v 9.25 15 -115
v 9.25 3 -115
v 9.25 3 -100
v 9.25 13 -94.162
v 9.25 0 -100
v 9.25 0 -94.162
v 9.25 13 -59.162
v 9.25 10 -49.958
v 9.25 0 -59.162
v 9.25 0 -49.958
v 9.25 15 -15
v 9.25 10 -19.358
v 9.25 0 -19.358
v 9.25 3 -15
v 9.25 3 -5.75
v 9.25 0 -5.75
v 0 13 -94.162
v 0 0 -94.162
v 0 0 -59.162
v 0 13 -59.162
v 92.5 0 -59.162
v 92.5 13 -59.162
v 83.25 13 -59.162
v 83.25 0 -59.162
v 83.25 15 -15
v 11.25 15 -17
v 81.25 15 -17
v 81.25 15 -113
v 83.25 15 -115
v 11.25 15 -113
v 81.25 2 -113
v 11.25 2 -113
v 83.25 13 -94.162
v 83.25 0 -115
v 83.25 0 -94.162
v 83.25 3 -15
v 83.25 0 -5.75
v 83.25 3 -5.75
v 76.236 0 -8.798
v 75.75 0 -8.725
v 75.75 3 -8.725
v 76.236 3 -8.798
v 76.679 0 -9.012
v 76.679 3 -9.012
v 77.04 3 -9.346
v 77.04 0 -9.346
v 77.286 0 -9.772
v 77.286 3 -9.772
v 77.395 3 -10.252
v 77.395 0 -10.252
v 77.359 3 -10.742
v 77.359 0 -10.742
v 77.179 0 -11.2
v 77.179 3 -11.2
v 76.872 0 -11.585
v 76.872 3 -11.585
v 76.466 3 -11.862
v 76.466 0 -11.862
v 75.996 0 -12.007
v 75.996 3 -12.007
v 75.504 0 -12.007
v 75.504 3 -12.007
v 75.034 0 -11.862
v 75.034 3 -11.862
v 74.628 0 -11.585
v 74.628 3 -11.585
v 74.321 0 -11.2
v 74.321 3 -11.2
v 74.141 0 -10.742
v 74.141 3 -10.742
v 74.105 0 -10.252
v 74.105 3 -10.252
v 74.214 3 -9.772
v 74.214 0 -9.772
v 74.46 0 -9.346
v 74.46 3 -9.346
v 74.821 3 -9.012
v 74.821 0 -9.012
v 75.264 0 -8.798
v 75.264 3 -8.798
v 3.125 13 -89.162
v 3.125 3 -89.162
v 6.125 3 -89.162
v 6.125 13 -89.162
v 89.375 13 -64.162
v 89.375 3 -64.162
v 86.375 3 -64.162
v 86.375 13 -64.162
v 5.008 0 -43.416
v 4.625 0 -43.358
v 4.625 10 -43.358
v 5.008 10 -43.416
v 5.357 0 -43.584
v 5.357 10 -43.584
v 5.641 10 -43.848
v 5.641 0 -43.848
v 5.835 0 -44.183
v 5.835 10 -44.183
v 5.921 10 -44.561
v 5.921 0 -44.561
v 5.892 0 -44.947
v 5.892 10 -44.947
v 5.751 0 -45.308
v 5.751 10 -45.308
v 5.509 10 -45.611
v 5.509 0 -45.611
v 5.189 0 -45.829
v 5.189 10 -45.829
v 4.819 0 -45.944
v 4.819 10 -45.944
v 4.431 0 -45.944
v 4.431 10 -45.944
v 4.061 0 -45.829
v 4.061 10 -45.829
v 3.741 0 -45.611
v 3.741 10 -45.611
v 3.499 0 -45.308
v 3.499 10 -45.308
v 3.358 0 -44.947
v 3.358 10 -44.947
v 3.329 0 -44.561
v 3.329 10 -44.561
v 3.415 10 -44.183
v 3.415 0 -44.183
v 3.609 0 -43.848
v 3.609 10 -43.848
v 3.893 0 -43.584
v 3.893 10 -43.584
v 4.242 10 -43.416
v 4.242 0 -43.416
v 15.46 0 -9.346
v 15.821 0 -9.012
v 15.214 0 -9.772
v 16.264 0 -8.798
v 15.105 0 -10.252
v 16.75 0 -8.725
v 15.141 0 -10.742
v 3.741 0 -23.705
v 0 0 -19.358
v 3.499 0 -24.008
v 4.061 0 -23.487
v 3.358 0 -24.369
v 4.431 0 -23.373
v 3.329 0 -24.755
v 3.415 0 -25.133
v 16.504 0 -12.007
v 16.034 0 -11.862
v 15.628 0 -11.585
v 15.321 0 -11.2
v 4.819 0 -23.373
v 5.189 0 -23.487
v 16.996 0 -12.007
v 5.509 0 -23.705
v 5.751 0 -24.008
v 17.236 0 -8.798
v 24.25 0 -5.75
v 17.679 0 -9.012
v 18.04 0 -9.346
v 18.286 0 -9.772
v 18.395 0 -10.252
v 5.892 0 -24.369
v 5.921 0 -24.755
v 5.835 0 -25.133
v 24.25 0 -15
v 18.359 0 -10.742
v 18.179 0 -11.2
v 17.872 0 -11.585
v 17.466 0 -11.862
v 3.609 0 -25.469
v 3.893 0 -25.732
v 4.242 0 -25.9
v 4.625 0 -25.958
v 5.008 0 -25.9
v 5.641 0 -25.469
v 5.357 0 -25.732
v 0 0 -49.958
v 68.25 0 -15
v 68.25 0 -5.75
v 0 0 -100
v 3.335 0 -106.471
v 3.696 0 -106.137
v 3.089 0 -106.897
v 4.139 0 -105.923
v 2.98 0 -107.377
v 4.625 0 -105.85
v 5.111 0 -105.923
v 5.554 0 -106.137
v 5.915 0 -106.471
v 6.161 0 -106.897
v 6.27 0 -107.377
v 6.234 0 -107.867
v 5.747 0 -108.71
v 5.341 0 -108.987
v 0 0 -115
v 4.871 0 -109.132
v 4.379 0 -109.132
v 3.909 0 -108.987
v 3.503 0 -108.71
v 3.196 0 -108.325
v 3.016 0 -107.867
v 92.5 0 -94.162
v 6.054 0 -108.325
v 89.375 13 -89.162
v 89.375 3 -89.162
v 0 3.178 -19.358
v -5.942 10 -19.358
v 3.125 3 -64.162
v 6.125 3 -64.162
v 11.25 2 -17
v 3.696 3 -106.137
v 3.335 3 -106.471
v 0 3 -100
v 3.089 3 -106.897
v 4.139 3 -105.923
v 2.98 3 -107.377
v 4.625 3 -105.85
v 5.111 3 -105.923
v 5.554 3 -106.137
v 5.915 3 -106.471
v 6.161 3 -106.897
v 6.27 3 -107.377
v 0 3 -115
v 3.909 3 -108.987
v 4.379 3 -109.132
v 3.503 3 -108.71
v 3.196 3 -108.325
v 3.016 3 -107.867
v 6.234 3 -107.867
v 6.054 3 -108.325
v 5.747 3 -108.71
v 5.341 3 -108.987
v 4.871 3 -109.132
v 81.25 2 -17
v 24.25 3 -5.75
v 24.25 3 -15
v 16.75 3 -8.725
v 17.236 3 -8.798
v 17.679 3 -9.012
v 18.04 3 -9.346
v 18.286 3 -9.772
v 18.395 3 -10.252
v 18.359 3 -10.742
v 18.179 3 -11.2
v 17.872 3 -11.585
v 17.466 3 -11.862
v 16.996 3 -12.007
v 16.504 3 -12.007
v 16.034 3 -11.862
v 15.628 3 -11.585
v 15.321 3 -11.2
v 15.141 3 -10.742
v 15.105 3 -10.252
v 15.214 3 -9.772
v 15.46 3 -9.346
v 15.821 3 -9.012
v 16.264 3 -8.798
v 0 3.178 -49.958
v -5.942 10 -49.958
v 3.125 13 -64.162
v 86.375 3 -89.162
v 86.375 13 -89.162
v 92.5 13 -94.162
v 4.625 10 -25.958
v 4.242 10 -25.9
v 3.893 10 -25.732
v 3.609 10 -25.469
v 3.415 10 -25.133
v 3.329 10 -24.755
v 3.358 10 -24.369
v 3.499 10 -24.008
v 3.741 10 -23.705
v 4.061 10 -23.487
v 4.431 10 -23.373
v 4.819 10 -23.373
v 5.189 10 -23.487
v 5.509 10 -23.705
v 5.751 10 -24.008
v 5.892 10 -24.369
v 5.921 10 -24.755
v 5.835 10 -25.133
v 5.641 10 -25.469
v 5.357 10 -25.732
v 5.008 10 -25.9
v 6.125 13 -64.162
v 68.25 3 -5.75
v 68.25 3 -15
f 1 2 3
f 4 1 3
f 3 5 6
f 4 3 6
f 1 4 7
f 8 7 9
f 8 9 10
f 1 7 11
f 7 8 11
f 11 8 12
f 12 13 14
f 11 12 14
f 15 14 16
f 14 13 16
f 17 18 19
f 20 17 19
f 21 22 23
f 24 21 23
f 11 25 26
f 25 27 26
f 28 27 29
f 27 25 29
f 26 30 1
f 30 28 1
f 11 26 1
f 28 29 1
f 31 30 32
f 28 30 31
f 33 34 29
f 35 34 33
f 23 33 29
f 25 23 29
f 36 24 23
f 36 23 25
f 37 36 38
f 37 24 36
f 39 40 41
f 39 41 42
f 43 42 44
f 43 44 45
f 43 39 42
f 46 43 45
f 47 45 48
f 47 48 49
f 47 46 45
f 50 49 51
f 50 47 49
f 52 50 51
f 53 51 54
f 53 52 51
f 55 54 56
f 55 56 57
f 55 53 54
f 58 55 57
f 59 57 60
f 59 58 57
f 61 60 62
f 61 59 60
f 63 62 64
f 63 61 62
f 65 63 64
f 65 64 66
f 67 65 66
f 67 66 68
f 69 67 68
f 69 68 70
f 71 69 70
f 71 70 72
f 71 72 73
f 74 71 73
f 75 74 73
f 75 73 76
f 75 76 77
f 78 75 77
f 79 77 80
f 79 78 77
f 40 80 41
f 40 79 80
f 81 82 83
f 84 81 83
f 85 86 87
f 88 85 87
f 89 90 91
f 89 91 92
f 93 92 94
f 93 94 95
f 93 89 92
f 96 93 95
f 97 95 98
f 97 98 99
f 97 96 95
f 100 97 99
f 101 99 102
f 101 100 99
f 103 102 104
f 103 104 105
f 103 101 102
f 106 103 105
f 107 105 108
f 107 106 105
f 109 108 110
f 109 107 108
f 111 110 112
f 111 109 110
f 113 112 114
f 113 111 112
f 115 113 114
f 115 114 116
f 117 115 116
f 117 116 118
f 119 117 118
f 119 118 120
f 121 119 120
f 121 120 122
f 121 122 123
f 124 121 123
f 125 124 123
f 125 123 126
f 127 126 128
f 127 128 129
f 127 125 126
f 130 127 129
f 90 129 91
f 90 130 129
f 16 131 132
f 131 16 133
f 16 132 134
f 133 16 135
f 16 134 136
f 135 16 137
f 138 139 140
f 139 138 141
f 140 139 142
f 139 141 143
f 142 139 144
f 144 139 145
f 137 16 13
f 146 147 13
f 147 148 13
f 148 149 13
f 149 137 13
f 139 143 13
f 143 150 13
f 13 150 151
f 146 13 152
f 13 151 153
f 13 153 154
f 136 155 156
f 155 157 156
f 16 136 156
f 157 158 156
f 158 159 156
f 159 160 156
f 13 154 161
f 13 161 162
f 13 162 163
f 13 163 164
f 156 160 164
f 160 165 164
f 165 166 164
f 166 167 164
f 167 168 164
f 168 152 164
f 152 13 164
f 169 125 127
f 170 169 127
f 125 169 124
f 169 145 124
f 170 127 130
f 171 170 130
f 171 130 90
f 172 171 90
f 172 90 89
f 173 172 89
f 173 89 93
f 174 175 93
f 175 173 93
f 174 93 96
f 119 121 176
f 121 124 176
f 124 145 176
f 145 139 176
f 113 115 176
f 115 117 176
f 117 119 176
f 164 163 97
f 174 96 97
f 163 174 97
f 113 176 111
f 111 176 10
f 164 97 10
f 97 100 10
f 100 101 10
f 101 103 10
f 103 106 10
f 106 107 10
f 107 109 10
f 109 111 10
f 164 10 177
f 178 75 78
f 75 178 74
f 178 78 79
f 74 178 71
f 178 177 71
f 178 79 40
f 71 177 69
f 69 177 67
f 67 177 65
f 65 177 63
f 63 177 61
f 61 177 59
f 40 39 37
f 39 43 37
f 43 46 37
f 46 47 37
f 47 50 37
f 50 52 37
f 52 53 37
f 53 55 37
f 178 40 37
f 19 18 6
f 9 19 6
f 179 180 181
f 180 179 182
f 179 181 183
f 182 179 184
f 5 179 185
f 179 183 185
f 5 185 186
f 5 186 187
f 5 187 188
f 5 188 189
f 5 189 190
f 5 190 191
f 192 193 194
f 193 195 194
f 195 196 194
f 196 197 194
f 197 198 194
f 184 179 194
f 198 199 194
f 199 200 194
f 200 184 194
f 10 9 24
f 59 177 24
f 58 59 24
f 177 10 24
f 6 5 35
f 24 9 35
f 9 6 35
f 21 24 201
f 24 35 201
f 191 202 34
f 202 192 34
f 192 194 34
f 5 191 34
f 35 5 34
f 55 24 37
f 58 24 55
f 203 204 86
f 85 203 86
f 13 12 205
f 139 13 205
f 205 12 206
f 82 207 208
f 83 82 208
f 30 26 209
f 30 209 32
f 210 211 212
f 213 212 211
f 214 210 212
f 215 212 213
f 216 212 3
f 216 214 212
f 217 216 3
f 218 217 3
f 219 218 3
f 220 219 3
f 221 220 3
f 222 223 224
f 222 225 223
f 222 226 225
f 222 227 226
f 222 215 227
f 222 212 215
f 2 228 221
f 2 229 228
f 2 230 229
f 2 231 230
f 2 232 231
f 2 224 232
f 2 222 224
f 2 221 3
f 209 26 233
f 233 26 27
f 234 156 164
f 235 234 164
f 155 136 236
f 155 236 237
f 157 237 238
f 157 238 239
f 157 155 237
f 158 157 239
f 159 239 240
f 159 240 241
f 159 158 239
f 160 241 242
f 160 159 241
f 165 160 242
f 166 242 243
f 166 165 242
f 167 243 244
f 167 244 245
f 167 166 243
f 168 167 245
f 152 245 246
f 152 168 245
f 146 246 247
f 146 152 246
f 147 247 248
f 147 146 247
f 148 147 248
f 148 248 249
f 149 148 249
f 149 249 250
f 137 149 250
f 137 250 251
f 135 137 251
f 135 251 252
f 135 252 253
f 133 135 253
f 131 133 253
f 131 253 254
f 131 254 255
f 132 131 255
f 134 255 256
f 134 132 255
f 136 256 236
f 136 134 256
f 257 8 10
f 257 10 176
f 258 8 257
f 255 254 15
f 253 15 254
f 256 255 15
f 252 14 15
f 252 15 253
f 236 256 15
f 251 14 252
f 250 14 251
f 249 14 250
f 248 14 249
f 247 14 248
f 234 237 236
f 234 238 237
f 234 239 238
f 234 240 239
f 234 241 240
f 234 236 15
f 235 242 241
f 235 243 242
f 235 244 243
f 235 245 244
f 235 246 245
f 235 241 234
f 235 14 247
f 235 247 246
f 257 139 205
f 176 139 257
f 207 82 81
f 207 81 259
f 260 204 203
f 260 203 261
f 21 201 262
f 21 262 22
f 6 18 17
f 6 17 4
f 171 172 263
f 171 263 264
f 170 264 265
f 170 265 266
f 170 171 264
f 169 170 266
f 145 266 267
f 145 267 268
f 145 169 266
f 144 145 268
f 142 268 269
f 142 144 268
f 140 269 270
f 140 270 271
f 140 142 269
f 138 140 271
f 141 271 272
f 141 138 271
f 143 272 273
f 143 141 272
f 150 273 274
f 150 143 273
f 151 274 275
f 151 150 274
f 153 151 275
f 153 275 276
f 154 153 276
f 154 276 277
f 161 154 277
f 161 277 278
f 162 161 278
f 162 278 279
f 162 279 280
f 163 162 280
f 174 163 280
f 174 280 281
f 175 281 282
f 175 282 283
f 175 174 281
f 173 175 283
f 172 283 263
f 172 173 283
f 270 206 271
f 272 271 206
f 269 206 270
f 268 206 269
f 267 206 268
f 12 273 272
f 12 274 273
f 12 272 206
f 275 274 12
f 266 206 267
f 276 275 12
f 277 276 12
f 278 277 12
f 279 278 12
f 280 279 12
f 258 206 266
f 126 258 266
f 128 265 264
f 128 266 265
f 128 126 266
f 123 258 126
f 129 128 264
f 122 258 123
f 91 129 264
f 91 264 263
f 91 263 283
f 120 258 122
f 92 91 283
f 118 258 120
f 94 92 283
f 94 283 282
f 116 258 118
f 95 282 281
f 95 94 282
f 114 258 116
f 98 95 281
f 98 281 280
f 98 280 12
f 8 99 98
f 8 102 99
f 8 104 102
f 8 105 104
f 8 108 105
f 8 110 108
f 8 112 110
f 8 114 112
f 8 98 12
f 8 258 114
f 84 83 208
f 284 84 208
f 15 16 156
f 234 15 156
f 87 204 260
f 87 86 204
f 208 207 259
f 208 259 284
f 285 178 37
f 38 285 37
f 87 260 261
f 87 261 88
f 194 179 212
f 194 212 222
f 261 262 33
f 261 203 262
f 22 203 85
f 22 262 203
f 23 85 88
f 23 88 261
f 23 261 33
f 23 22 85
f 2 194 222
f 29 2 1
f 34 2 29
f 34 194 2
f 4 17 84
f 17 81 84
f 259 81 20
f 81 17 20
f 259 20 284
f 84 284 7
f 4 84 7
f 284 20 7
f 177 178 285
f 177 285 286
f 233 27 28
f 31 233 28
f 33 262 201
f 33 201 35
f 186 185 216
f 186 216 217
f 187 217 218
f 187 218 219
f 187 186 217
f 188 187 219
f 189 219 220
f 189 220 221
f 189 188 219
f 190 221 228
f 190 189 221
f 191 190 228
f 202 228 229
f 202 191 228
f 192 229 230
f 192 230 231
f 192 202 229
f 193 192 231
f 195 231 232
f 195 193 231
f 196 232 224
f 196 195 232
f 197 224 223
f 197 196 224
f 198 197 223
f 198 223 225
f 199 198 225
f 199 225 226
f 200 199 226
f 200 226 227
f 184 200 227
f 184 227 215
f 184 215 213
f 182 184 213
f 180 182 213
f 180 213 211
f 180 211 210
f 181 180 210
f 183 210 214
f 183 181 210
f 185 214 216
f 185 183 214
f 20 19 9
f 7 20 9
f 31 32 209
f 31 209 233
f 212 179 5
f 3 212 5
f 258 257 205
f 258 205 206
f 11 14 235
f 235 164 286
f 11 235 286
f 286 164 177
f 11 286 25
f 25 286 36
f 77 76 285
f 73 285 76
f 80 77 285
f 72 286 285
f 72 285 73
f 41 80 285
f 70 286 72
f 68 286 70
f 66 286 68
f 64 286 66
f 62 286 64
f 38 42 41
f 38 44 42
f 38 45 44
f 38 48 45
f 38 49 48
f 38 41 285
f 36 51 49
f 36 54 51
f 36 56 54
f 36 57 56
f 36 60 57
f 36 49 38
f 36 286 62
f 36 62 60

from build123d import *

# Parameters (mm, degrees)
BOSS_EXTRUDE1_DEPTH = 15
SKETCH2_3_W         = 9.25
SKETCH2_3_H         = 15
SKETCH2_3_R         = 1.65
SKETCH2_3_W_2       = 15
SKETCH2_3_H_2       = 9.25
BOSS_EXTRUDE2_DEPTH = 3
SKETCH3_W           = 70
SKETCH3_H           = 96
CUT_EXTRUDE1_DEPTH  = 13
SKETCH5_W           = 9.25
SKETCH5_H           = 30.6
SKETCH5_R           = 1.3
BOSS_EXTRUDE4_DEPTH = 10
BOSS_EXTRUDE5_DEPTH = 30.6
SKETCH9_W           = 9.25
SKETCH9_H           = 35
BOSS_EXTRUDE6_DEPTH = 3
SKETCH9_4_W         = 9.25
SKETCH9_4_H         = 35
SKETCH9_4_W_2       = 3
SKETCH9_4_H_2       = 25
BOSS_EXTRUDE7_DEPTH = 13


with BuildPart() as part:
    # Sketch2 → Boss-Extrude1 (new body)
    with BuildSketch(Plane(origin=(0, 0, 0), x_dir=(1, 0, 0), z_dir=(0, 1, 0))):
        Polygon((9.25, 100), (9.25, 115), (83.25, 115), (83.25, 15), (68.25, 15), (24.25, 15), (9.25, 15), align=None)
    extrude(amount=BOSS_EXTRUDE1_DEPTH)

    # Sketch2<3> → Boss-Extrude2 (add)
    # profile 1 of 3: a face of its own
    with BuildSketch(Plane(origin=(0, 0, 0), x_dir=(1, 0, 0), z_dir=(0, 1, 0))):
        with Locations((4.625, 107.5)):
            Rectangle(SKETCH2_3_W, SKETCH2_3_H)
        with Locations(Location((4.625, 107.5, 0), (0, 0, 270))):
            Circle(SKETCH2_3_R, mode=Mode.SUBTRACT)
    # profile 2 of 3: a face of its own
    with BuildSketch(Plane(origin=(0, 0, 0), x_dir=(1, 0, 0), z_dir=(0, 1, 0))):
        with Locations((16.75, 10.375)):
            Rectangle(SKETCH2_3_W_2, SKETCH2_3_H_2)
        with Locations(Location((16.75, 10.375, 0), (0, 0, 270))):
            Circle(SKETCH2_3_R, mode=Mode.SUBTRACT)
    # profile 3 of 3: a face of its own
    with BuildSketch(Plane(origin=(0, 0, 0), x_dir=(1, 0, 0), z_dir=(0, 1, 0))):
        with Locations((75.75, 10.375)):
            Rectangle(SKETCH2_3_W_2, SKETCH2_3_H_2)
        with Locations(Location((75.75, 10.375, 0), (0, 0, 270))):
            Circle(SKETCH2_3_R, mode=Mode.SUBTRACT)
    extrude(amount=BOSS_EXTRUDE2_DEPTH)

    # Sketch3 → Cut-Extrude1 (cut)
    with BuildSketch(Plane(origin=(0, 15, 0), x_dir=(1, 0, 0), z_dir=(0, 1, 0))):
        with Locations((46.25, 65)):
            Rectangle(SKETCH3_W, SKETCH3_H)
    extrude(amount=-CUT_EXTRUDE1_DEPTH, mode=Mode.SUBTRACT)

    # Sketch5 → Boss-Extrude4 (add)
    with BuildSketch(Plane(origin=(0, 0, 0), x_dir=(1, 0, 0), z_dir=(0, 1, 0))):
        with Locations((4.625, 34.658045924)):
            Rectangle(SKETCH5_W, SKETCH5_H)
        with Locations(Location((4.625, 44.658045924, 0), (0, 0, 270))):
            Circle(SKETCH5_R, mode=Mode.SUBTRACT)
        with Locations(Location((4.625, 24.658045924, 0), (0, 0, 90))):
            Circle(SKETCH5_R, mode=Mode.SUBTRACT)
    extrude(amount=BOSS_EXTRUDE4_DEPTH)

    # Sketch6 → Boss-Extrude5 (add)
    with BuildSketch(Plane(origin=(0, 0, -49.958045924), x_dir=(-1, 0, 0), z_dir=(0, 0, -1))):
        Polygon((0, 3.177665999), (5.942499885, 10), (0, 10), align=None)
    extrude(amount=-BOSS_EXTRUDE5_DEPTH)

    # Sketch9 → Boss-Extrude6 (add)
    with BuildSketch(Plane.XZ):
        with Locations((4.625, -76.661539041)):
            Rectangle(SKETCH9_W, SKETCH9_H)
    boss_extrude6 = extrude(amount=-BOSS_EXTRUDE6_DEPTH)

    # Sketch9<4> → Boss-Extrude7 (add)
    with BuildSketch(Plane.XZ):
        with Locations((4.625, -76.661539041)):
            Rectangle(SKETCH9_4_W, SKETCH9_4_H)
        with Locations((4.625, -76.661539041)):
            Rectangle(SKETCH9_4_W_2, SKETCH9_4_H_2, mode=Mode.SUBTRACT)
    boss_extrude7 = extrude(amount=-BOSS_EXTRUDE7_DEPTH)

    # Mirror1: Boss-Extrude6, Boss-Extrude7 across plane
    add(boss_extrude6.mirror(Plane.ZY.offset(-46.25)))
    add(boss_extrude7.mirror(Plane.ZY.offset(-46.25)))


solid = part.part
